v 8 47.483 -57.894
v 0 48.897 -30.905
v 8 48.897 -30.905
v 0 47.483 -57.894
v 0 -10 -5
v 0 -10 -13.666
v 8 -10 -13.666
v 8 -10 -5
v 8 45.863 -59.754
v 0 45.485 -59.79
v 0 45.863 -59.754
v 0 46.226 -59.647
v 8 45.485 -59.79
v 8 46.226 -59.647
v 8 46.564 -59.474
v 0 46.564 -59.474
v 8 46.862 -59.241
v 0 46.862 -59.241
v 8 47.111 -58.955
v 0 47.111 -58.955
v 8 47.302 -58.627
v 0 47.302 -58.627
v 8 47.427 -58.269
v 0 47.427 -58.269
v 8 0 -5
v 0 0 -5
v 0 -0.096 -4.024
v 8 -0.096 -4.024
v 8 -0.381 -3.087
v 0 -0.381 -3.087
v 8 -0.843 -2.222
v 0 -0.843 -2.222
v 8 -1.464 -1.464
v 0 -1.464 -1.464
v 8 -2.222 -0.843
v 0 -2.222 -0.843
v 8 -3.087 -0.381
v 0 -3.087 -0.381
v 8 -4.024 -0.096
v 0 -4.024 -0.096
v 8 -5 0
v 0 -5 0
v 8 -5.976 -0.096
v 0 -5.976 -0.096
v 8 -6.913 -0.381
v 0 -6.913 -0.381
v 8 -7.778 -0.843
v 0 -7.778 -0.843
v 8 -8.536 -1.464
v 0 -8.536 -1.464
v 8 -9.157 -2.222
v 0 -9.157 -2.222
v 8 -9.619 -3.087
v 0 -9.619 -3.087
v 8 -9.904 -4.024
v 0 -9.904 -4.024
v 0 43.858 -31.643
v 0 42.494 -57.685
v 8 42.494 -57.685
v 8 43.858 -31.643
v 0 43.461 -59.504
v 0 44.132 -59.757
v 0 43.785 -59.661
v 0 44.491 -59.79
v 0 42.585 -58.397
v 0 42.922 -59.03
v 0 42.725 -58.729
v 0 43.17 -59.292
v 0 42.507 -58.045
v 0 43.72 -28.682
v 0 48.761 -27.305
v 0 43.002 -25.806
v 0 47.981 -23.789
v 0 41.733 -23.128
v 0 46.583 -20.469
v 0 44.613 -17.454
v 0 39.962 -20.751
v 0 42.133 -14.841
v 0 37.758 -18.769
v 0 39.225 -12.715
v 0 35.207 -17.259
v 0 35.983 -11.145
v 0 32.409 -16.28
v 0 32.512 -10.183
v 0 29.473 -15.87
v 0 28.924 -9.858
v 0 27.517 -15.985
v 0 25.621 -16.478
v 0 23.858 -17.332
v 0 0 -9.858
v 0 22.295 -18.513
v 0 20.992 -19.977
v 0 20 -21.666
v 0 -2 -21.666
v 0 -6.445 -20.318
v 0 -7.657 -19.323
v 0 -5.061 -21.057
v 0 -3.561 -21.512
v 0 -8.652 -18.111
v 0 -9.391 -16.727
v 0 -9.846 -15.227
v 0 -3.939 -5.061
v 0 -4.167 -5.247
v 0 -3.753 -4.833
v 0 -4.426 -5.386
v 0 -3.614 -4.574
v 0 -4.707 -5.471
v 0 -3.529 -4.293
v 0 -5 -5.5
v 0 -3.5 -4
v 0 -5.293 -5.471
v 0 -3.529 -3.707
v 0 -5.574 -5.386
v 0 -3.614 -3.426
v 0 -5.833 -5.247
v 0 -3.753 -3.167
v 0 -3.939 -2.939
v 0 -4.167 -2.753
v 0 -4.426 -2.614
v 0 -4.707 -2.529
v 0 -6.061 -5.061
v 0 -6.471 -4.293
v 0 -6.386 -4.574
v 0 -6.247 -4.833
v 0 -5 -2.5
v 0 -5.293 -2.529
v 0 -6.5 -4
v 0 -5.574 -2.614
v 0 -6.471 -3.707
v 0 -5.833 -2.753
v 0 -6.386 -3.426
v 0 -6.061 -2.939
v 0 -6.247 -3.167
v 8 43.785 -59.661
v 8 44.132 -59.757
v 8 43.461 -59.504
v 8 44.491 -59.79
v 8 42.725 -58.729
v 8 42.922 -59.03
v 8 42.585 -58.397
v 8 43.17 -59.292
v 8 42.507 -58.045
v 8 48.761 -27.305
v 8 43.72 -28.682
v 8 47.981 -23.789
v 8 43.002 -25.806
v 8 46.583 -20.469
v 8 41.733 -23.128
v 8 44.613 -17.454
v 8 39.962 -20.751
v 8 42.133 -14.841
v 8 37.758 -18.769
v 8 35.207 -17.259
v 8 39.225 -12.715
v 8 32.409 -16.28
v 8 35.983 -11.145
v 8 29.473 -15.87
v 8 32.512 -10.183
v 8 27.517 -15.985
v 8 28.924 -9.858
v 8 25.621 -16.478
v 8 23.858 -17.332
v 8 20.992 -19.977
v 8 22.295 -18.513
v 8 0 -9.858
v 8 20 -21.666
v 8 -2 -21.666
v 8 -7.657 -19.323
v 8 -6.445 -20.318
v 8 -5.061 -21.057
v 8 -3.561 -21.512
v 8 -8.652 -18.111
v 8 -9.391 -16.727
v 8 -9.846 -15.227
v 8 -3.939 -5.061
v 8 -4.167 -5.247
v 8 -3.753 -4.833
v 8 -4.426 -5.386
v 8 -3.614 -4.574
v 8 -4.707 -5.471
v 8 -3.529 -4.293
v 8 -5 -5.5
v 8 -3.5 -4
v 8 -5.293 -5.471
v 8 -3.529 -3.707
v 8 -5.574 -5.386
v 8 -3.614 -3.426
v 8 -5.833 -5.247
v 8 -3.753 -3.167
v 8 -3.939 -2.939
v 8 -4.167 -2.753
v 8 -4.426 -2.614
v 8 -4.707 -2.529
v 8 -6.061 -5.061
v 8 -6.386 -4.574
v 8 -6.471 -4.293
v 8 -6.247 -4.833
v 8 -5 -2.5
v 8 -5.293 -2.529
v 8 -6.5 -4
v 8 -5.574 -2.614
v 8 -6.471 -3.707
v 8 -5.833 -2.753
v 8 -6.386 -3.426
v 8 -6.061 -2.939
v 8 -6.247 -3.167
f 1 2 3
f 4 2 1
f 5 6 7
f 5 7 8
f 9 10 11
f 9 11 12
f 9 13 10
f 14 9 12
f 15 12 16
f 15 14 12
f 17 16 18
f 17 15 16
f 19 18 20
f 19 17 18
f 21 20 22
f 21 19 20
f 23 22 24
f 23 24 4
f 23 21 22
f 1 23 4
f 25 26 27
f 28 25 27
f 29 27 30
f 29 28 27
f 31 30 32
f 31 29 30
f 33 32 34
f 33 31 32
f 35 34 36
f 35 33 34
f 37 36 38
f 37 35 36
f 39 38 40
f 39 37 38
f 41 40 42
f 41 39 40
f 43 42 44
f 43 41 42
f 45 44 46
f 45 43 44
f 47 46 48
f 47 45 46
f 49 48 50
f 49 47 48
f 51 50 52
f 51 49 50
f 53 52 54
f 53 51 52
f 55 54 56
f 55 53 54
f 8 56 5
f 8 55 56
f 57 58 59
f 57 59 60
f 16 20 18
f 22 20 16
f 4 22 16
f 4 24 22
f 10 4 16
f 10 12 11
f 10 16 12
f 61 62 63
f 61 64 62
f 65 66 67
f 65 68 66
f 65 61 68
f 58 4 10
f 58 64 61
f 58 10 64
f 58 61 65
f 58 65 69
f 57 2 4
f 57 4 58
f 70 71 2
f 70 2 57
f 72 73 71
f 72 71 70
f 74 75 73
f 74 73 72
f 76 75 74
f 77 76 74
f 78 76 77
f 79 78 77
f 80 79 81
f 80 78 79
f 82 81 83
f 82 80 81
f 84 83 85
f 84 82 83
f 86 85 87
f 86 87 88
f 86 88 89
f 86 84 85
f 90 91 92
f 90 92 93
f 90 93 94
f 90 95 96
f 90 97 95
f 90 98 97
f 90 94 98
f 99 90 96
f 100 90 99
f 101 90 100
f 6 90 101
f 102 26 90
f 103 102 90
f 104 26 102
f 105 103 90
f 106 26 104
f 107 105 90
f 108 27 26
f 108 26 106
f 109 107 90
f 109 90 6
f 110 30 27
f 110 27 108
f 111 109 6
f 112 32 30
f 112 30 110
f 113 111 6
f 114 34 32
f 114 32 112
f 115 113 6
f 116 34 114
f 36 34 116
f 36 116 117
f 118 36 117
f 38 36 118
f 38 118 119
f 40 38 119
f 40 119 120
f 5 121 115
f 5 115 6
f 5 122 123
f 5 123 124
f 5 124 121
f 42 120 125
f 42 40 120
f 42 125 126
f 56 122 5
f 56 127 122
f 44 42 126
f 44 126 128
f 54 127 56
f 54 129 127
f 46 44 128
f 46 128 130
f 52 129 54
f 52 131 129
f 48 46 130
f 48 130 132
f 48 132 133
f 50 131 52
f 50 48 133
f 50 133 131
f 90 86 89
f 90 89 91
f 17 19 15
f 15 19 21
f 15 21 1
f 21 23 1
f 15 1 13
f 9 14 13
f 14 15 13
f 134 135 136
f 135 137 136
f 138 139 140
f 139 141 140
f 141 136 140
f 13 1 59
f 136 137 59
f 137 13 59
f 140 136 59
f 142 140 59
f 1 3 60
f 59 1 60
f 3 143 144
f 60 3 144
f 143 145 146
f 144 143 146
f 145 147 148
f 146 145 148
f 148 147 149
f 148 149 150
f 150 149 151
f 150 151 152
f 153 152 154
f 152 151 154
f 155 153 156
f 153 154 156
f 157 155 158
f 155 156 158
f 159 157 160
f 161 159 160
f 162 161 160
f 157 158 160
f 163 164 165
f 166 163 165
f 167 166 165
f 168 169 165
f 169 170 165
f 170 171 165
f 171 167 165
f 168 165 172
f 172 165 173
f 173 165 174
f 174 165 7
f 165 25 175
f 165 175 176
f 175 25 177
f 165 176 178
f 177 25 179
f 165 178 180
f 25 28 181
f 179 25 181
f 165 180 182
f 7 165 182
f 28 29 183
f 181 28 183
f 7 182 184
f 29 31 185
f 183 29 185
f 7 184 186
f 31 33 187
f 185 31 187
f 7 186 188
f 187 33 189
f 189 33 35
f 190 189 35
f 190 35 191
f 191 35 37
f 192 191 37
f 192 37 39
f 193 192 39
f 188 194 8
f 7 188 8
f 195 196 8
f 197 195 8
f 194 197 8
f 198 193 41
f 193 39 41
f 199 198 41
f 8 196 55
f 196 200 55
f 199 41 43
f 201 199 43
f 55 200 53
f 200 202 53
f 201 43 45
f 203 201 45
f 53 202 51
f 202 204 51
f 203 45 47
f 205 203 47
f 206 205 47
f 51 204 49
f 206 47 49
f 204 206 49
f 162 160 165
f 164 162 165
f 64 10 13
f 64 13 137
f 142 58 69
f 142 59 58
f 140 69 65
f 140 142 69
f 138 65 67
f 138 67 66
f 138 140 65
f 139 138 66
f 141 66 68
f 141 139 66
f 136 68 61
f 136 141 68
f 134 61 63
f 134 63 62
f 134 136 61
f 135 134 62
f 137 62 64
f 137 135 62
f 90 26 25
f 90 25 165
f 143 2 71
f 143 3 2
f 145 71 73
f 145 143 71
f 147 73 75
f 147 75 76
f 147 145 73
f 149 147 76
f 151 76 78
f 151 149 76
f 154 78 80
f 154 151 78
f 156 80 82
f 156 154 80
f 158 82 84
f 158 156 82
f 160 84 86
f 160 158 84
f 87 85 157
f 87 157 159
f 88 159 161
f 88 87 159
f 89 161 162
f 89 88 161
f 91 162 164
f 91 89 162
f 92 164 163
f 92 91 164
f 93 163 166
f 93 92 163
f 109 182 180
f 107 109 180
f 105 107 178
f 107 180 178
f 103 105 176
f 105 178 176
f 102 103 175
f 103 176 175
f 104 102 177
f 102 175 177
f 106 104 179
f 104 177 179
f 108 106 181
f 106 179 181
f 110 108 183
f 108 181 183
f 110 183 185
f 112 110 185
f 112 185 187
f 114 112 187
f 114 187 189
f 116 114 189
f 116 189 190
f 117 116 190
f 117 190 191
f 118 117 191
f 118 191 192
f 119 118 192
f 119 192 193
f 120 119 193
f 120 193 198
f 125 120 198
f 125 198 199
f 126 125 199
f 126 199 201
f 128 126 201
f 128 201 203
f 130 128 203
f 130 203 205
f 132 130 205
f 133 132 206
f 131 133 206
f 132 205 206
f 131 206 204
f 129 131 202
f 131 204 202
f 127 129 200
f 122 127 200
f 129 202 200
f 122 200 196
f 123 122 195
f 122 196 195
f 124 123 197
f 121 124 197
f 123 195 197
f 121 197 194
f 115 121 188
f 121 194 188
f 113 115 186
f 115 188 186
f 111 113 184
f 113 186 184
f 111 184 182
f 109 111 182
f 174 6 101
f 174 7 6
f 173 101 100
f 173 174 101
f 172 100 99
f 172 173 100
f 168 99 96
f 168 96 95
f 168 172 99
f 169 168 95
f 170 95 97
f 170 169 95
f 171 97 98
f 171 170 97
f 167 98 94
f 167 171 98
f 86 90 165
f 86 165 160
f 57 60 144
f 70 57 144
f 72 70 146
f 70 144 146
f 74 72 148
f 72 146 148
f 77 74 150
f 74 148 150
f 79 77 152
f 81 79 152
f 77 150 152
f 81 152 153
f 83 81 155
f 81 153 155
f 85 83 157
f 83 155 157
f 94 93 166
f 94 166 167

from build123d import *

# Parameters (mm, degrees)
BOSS_EXTRUDE2_DEPTH = 8
FILLET1_R           = 15
FILLET2_R           = 20
FILLET3_R           = 10
FILLET4_R           = 2
FILLET5_R           = 5
SKETCH3_R           = 1.5
CUT_EXTRUDE1_DEPTH  = 78.668634045
FILLET6_R           = 8


# Some blends are built 0.0001 mm under size
with BuildPart() as part:
    # Sketch2 → Boss-Extrude2 (new body)
    with BuildSketch(Plane(origin=(0, 0, 0), x_dir=(0, 0, -1), z_dir=(1, 0, 0))):
        Polygon((0, 0), (9.858322093, 0), (9.858322093, 50), (59.789798831, 47.383202188), (59.789798831, 42.383202188), (15.858322093, 44.685553324), (15.858322093, 20), (21.66602455, 20), (21.66602455, -10), (0, -10), align=None)
    extrude(amount=BOSS_EXTRUDE2_DEPTH)

    # Fillet1
    fillet1_edges = [part.edges().sort_by_distance(p)[0] for p in [
        (4, 44.685553324, -15.858322093),
    ]]
    fillet(fillet1_edges, radius=FILLET1_R)

    # Fillet2
    fillet2_edges = [part.edges().sort_by_distance(p)[0] for p in [
        (4, 50, -9.858322093),
    ]]
    fillet(fillet2_edges, radius=FILLET2_R)

    # Fillet3
    # the kernel refuses this fillet: 10 mm, written as the material it adds along each edge
    with BuildSketch(Plane(origin=(0, 20, -15.858322093), x_dir=(0, 0.9999992265968354, -0.0012437064489906054), z_dir=(1, 0, 0))) as fillet3_piece_1:
        with BuildLine():
            CenterArc((9.089422143, -9.992630476), FILLET3_R, 87.800195831, 67.460307547)
            Line((0.007223077, -5.807697966), (-0.90099683, -5.389204715))
            ThreePointArc((-0.90099683, -5.389204715), (-0.996387688, -2.905092689), (-0.999999227, -0.001243706))
            Line((-0.999999227, -0.001243706), (-0.001243706, 0.999999227))
            ThreePointArc((-0.001243706, 0.999999227), (8.877600872, 1.011041911), (9.511650474, 0.999263048))
            Line((9.511650474, 0.999263048), (9.473266081, 0))
        make_face()
    extrude(amount=8)

    # Fillet4
    fillet4_edges = [part.edges().sort_by_distance(p)[0] for p in [
        (4, 47.383202188, -59.789798831),
        (4, 42.383202188, -59.789798831),
    ]]
    fillet(fillet4_edges, radius=FILLET4_R)

    # Fillet5
    fillet5_edges = [part.edges().sort_by_distance(p)[0] for p in [
        (4, -10, 0),
        (4, 0, 0),
    ]]
    fillet(fillet5_edges, radius=FILLET5_R - 0.0001)  # a hair under: the kernel refuses the full size

    # Sketch3 → Cut-Extrude1 (cut, through all)
    with BuildSketch(Plane(origin=(8, 0, 0), x_dir=(0, 0, -1), z_dir=(1, 0, 0))):
        with Locations((4, -5)):
            Circle(SKETCH3_R)
    extrude(amount=-CUT_EXTRUDE1_DEPTH, mode=Mode.SUBTRACT)

    # Fillet6
    fillet6_edges = [part.edges().sort_by_distance(p)[0] for p in [
        (4, -10, -21.66602455),
    ]]
    fillet(fillet6_edges, radius=FILLET6_R)


solid = part.part
